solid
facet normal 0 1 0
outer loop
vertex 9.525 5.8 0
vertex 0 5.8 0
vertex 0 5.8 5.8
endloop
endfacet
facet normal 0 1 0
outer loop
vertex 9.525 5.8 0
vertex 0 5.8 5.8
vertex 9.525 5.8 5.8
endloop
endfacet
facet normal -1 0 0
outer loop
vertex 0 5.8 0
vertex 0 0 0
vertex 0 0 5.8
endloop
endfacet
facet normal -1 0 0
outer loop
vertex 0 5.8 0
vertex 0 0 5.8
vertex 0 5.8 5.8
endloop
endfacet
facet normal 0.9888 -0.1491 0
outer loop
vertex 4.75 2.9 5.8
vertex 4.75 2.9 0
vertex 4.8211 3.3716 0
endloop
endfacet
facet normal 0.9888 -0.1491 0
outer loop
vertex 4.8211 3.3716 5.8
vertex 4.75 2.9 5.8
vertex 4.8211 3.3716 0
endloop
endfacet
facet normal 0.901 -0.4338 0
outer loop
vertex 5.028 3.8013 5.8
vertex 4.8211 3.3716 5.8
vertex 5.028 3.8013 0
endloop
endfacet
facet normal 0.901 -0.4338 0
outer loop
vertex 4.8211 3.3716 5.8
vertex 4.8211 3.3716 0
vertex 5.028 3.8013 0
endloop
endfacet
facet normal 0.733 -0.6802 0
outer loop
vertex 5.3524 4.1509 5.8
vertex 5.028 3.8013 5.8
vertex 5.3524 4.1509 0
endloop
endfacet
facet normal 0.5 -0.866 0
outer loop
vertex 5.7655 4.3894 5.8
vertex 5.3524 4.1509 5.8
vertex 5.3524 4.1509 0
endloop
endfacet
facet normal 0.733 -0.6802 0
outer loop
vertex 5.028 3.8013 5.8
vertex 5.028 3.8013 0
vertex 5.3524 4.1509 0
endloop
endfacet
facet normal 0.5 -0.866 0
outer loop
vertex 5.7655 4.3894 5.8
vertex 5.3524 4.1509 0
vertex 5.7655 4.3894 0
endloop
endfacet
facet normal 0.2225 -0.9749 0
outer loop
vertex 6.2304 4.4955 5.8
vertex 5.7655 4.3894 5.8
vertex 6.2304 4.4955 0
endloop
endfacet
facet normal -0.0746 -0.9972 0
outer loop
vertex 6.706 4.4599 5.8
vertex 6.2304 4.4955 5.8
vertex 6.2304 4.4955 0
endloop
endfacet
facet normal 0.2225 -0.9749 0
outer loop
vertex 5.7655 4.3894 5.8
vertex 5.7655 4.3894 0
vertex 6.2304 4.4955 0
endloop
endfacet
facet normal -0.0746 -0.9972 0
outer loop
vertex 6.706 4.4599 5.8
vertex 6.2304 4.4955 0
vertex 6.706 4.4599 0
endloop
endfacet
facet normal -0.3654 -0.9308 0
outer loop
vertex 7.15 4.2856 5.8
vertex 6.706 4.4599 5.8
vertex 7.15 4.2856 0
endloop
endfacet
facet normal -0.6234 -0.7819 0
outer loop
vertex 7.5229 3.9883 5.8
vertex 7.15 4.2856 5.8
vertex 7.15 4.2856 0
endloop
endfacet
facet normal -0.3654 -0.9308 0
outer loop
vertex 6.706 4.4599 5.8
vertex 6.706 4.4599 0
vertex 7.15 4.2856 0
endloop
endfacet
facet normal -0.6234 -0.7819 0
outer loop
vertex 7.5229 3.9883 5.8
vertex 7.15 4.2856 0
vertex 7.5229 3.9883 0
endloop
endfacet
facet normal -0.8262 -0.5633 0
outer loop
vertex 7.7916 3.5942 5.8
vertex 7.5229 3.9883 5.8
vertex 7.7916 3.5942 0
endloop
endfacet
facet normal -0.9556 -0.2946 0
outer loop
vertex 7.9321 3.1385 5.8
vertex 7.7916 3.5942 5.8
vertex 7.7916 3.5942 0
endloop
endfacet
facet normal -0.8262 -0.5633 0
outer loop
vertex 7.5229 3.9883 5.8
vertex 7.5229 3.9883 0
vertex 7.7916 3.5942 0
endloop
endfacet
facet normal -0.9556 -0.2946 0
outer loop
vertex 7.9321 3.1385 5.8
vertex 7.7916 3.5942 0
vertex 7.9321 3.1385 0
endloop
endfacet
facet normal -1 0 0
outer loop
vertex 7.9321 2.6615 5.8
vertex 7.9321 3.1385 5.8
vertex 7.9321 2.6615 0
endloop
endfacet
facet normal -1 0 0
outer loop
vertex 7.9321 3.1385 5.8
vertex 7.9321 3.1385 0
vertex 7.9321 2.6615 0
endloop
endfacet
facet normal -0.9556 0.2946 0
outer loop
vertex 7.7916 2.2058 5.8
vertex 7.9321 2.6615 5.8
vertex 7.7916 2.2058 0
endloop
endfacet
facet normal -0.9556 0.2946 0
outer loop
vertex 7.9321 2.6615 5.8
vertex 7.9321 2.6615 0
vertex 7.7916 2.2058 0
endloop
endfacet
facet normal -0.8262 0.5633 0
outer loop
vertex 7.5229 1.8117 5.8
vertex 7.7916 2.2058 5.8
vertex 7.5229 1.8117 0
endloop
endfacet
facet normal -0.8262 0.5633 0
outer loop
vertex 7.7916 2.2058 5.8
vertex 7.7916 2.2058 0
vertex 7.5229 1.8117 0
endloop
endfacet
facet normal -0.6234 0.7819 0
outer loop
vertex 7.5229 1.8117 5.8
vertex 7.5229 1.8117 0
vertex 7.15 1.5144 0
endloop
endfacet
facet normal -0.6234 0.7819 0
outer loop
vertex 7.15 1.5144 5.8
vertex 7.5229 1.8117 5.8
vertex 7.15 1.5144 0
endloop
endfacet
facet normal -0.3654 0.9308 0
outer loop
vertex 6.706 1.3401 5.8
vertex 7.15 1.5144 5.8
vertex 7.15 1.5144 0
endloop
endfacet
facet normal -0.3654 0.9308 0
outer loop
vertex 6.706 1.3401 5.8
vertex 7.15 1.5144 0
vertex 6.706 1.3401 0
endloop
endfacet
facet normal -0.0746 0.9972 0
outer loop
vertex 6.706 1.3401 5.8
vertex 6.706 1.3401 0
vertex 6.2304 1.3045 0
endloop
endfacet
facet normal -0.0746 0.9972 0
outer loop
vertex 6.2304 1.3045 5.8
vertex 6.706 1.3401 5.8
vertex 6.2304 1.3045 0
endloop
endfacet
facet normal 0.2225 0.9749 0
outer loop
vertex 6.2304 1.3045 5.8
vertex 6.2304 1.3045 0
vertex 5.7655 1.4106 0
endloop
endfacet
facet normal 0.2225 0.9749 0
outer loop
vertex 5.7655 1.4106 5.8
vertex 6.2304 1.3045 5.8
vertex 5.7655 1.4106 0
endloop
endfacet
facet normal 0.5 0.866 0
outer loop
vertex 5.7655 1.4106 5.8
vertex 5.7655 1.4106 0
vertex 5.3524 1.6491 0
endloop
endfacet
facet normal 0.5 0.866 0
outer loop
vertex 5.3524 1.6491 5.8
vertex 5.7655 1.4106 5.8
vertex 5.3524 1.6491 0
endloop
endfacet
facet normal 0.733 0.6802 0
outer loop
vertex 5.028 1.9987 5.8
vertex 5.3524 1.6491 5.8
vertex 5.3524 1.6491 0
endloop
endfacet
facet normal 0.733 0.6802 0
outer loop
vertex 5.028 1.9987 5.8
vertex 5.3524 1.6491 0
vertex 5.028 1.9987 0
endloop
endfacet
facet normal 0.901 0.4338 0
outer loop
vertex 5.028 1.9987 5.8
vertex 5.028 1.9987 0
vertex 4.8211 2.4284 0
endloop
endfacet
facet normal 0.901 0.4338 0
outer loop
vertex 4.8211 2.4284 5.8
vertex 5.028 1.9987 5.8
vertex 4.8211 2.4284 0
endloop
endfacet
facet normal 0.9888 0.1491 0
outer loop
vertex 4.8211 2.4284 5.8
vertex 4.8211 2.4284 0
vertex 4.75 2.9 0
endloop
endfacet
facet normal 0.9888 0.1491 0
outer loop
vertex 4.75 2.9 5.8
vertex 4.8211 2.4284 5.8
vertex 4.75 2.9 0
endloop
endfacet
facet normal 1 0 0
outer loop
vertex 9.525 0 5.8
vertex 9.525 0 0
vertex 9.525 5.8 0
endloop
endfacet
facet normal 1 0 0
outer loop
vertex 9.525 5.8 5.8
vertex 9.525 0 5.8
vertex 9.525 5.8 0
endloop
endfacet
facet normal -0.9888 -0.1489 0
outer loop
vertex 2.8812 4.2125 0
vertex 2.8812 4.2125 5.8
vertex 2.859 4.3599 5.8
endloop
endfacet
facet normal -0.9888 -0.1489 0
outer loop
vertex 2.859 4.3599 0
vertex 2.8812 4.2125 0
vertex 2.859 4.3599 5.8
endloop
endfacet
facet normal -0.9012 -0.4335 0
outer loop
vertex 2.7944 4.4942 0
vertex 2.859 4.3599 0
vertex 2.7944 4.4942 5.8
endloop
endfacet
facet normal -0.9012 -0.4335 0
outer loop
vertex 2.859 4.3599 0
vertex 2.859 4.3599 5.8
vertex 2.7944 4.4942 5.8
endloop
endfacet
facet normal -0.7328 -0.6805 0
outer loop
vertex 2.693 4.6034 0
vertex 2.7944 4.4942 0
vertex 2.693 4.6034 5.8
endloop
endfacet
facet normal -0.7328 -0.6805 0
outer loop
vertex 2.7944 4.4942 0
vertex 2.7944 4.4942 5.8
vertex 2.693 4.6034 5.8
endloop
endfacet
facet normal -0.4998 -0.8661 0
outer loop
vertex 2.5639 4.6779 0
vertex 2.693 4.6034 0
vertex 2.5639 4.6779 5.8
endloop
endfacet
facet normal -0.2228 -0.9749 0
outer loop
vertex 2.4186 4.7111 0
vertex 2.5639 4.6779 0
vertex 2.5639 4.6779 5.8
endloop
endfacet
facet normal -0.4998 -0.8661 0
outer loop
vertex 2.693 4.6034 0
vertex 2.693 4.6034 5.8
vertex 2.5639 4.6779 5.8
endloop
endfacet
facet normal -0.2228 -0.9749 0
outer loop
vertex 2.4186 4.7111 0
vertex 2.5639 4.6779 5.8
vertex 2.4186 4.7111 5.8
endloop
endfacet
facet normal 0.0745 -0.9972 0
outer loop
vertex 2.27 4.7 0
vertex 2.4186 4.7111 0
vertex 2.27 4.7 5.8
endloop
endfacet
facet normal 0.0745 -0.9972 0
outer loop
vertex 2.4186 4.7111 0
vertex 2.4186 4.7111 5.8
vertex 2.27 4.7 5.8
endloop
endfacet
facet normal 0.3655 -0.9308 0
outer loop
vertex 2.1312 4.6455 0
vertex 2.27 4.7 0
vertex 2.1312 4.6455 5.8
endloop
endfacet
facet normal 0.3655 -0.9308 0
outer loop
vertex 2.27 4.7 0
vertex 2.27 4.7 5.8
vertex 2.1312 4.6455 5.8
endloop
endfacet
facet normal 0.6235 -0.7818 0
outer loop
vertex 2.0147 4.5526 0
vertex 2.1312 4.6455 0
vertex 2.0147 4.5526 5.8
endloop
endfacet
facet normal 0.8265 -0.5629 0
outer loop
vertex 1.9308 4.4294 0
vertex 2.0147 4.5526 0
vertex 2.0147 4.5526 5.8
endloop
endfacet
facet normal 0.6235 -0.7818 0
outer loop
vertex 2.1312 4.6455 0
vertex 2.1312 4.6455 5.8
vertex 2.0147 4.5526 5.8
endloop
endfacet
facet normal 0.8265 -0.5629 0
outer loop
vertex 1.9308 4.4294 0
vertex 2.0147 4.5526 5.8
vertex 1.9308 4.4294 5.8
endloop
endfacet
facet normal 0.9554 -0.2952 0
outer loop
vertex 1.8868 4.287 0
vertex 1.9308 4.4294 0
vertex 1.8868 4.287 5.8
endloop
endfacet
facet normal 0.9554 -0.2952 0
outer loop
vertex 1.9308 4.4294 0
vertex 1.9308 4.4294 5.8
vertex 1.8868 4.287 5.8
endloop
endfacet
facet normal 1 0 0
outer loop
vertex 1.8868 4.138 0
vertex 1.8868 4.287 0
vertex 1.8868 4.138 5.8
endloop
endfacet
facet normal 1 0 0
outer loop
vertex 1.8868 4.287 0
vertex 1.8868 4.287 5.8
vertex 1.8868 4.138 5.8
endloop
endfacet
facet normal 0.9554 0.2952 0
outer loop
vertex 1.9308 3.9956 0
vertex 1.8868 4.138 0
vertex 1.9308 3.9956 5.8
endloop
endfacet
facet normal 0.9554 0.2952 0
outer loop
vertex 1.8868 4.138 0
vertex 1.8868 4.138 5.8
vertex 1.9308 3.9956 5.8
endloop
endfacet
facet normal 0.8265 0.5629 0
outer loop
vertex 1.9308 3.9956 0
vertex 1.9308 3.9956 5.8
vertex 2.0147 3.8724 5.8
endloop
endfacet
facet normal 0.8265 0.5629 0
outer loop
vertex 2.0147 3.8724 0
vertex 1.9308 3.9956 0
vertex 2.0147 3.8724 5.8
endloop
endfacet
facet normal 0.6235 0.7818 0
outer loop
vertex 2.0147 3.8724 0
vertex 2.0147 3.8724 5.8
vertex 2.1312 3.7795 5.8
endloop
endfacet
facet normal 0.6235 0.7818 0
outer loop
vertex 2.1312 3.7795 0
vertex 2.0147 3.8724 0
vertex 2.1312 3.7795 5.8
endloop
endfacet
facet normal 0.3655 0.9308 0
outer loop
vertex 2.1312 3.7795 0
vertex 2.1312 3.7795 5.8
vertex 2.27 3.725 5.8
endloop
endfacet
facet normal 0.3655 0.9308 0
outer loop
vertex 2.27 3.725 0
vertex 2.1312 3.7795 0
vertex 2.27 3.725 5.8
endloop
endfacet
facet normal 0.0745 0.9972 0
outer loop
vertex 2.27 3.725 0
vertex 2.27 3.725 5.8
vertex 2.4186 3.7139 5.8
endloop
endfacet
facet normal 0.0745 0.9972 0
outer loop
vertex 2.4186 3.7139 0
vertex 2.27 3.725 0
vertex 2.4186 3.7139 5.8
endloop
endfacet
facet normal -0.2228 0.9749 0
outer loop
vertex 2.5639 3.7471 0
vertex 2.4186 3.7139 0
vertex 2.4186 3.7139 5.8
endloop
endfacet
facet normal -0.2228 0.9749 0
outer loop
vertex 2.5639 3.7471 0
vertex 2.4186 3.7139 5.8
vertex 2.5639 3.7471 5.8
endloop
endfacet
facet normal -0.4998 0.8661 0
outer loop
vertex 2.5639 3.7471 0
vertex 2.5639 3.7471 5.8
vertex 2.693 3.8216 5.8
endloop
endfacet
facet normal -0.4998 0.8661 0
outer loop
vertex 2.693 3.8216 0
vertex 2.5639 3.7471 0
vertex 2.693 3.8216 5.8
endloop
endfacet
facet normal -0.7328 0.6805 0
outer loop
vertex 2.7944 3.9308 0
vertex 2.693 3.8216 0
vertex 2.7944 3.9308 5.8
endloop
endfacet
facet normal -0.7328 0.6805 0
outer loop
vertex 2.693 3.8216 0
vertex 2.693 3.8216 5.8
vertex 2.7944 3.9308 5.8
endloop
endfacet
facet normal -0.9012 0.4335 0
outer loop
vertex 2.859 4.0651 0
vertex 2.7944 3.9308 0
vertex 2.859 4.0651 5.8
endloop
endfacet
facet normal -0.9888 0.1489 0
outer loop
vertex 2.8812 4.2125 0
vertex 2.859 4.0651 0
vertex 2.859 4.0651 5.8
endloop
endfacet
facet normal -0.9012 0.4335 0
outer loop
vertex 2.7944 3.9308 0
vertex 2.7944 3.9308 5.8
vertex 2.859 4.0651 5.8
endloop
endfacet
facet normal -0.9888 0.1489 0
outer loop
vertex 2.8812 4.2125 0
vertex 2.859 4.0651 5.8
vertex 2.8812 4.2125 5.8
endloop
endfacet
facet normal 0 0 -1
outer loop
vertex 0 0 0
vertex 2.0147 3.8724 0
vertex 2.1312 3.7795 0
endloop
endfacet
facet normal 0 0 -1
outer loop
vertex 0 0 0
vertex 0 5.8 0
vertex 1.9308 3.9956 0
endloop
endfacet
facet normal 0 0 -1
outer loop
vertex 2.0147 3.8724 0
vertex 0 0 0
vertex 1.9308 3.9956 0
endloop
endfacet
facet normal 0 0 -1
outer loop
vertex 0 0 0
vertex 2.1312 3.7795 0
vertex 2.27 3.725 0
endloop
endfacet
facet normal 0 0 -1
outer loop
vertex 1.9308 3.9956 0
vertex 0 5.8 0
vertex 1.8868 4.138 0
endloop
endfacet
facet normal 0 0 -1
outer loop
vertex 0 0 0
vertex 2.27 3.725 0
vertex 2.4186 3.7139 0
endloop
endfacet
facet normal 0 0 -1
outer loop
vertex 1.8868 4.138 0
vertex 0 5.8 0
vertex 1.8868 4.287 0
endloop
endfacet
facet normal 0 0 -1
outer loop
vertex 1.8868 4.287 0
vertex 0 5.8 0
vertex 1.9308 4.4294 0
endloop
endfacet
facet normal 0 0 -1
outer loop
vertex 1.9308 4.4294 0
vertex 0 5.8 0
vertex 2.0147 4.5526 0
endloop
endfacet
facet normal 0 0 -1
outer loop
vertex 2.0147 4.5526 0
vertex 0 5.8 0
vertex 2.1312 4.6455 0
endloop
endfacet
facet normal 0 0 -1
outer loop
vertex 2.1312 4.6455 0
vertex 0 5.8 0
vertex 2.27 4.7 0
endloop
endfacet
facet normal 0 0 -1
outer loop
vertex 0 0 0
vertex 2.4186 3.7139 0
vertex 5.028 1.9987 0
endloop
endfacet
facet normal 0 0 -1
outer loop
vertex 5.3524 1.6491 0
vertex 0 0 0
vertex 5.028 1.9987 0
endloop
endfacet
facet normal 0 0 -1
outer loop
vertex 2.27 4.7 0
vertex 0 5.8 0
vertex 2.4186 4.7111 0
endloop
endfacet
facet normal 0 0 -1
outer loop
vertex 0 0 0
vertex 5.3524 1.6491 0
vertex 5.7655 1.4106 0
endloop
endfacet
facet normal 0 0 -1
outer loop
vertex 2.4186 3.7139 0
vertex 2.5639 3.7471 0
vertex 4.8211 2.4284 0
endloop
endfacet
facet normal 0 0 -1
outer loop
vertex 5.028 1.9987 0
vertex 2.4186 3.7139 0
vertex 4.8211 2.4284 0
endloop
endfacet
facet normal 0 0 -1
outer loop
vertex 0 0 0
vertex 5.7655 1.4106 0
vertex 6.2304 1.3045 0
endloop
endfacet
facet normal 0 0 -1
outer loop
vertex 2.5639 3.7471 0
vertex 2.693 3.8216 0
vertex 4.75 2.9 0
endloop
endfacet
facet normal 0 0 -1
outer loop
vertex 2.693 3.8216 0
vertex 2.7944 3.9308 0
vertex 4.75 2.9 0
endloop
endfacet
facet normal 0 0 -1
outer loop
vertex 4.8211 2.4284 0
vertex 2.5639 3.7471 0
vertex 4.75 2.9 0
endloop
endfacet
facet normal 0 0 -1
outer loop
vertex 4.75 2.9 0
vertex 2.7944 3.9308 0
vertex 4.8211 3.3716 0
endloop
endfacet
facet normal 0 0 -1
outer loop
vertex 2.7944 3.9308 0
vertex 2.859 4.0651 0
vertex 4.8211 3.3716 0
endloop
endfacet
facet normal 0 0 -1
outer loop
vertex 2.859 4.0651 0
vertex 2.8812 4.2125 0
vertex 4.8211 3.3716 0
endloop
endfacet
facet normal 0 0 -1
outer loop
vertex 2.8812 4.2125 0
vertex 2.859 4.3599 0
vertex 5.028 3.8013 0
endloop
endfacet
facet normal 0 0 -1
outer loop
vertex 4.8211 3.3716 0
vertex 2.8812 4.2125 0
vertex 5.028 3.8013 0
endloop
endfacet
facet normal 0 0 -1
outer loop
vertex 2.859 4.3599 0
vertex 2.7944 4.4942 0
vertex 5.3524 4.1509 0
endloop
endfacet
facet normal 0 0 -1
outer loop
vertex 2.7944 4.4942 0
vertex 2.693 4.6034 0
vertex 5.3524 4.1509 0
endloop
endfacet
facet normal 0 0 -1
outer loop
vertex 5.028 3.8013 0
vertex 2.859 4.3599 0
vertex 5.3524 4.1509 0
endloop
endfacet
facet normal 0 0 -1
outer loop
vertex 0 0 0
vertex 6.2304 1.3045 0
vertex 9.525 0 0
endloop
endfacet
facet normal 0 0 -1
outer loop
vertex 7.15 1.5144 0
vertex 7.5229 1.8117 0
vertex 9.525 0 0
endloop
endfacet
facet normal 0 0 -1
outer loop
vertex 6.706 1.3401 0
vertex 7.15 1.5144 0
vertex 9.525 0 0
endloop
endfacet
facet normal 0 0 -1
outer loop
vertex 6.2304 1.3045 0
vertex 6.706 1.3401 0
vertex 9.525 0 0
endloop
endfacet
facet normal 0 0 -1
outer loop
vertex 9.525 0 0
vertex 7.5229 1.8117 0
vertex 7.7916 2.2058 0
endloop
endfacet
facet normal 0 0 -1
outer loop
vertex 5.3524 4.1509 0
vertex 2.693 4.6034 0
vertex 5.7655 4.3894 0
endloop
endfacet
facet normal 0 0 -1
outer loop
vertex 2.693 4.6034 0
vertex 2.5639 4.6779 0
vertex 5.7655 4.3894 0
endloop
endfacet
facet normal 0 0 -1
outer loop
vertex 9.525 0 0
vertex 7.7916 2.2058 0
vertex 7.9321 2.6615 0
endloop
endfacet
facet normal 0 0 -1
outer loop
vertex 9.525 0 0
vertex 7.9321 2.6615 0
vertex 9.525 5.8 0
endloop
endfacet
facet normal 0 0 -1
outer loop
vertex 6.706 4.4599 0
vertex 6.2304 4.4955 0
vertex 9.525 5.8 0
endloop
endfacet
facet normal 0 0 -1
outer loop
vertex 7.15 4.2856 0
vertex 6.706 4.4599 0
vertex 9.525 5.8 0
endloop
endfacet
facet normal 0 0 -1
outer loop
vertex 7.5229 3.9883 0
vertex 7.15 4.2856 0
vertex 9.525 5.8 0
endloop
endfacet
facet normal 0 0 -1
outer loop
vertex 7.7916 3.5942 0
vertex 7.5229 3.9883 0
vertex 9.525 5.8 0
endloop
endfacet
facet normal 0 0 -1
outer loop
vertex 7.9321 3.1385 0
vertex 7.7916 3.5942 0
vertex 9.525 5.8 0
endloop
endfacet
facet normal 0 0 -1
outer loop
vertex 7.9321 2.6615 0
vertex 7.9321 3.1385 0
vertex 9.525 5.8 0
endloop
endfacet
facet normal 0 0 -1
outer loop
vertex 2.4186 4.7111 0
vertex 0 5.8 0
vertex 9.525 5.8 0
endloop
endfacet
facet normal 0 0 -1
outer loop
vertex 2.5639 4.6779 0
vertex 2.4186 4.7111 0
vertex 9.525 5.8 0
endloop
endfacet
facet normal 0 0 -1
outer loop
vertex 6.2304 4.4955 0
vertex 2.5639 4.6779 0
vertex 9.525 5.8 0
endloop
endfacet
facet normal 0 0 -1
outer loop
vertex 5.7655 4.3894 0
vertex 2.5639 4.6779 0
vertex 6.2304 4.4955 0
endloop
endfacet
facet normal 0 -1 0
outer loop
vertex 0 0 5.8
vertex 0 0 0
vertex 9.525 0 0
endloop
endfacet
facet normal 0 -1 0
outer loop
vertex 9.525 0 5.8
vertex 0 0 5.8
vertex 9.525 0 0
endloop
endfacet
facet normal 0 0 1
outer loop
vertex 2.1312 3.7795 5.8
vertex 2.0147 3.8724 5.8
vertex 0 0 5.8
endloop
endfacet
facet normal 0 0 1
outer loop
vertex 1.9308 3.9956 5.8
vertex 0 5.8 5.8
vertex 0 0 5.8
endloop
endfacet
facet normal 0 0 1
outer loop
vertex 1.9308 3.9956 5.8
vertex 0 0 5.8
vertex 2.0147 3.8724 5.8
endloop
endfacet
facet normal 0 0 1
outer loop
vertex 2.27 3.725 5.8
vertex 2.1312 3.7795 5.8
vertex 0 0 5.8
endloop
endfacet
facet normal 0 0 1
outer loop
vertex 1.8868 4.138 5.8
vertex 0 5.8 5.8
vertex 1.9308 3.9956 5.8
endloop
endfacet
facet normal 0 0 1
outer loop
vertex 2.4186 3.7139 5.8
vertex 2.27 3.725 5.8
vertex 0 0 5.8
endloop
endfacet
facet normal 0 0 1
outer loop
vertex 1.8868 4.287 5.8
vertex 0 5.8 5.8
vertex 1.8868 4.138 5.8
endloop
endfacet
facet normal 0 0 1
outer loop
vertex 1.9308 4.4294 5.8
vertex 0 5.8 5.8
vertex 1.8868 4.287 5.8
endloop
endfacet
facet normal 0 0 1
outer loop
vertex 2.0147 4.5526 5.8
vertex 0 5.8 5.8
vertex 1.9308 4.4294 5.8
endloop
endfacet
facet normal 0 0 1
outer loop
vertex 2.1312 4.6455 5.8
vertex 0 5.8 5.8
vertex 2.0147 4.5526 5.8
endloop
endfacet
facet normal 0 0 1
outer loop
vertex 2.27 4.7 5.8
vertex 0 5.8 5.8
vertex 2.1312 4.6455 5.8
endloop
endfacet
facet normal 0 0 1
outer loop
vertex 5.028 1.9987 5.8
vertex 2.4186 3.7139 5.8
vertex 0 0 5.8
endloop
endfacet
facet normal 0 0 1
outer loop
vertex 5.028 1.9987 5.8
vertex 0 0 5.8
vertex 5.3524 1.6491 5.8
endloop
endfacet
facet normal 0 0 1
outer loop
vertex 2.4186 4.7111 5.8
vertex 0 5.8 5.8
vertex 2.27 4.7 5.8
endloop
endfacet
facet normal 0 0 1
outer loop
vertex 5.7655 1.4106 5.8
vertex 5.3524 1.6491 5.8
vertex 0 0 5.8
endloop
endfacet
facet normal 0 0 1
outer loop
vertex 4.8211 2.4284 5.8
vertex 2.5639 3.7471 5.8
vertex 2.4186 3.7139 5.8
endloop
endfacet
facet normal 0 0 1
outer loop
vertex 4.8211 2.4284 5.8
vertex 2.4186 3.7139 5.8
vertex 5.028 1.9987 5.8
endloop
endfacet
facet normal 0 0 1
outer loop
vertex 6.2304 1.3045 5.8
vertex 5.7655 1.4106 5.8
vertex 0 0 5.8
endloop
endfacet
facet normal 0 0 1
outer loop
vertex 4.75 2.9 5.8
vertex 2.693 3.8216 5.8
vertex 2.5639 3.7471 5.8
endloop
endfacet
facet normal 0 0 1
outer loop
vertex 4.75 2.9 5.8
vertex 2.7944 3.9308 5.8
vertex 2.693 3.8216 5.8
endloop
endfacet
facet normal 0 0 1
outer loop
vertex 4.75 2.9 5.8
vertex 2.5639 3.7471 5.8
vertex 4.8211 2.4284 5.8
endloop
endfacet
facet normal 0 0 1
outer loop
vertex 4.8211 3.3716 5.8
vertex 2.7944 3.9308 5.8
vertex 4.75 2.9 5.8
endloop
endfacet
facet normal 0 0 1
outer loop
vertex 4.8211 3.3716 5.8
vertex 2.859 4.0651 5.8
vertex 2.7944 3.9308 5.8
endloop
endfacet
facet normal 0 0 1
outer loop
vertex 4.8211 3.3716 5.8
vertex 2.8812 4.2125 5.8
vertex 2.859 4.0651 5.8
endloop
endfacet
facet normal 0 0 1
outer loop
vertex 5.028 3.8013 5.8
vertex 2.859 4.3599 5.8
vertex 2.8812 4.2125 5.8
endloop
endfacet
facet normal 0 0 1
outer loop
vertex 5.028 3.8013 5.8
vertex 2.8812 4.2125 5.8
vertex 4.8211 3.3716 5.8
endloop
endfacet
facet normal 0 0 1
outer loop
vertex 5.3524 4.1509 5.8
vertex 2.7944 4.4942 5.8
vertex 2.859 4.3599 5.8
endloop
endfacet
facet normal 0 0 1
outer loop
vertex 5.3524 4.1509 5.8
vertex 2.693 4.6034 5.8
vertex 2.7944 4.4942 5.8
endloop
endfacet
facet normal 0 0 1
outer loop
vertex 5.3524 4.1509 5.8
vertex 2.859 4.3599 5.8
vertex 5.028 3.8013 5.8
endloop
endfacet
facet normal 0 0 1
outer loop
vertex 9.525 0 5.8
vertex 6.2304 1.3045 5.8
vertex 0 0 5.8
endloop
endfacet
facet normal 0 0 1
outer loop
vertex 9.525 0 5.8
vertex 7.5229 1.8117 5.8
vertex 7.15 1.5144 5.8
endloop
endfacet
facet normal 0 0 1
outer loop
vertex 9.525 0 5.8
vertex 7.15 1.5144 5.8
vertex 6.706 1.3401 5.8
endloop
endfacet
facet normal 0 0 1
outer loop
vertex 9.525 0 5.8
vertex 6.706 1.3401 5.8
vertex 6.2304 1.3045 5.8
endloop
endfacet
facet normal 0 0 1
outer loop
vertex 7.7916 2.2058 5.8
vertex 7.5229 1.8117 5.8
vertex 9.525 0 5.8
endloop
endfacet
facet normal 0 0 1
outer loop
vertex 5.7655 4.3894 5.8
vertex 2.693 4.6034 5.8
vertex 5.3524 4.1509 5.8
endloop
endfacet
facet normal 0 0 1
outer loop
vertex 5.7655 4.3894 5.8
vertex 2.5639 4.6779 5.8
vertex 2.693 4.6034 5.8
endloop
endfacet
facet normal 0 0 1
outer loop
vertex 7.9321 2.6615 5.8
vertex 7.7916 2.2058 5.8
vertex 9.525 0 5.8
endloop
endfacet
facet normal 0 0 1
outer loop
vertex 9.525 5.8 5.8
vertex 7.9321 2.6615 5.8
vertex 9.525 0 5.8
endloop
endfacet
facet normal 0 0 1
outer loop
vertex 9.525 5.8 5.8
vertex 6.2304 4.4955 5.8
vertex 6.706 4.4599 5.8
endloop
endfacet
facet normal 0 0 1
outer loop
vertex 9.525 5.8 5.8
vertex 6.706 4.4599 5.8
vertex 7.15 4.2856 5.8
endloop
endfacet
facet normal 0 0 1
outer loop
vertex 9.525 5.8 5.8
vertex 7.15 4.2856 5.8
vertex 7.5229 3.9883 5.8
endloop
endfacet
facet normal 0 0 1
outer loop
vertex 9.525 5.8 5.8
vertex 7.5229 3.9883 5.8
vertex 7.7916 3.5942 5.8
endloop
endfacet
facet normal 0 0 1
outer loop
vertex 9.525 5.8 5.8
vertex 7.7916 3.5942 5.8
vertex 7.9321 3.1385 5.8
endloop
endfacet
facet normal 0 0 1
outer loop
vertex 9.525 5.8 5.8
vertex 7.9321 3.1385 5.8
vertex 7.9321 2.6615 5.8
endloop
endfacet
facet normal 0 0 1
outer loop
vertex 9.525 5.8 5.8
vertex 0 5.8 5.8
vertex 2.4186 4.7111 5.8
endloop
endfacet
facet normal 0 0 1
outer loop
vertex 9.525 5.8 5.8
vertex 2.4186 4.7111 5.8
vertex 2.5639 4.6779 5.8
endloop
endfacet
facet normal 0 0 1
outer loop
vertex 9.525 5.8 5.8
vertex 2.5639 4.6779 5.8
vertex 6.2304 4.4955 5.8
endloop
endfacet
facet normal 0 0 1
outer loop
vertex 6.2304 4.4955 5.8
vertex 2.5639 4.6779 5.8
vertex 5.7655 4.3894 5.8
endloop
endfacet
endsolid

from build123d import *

# Parameters (mm, degrees)
SKETCH1_W                = 9.525
SKETCH1_H                = 5.8
BOSS_EXTRUDE1_DEPTH      = 5.8
M3_CLEARANCE_HOLE1_D     = 3.2
M3_CLEARANCE_HOLE1_DEPTH = 12.7
M3_CLEARANCE_HOLE1_TIP   = 0.96137699
SKETCH5_R                = 0.5
CUT_EXTRUDE1_DEPTH       = 5.8


with BuildPart() as part:
    # Sketch1 → Boss-Extrude1 (new body)
    with BuildSketch(Plane.XY):
        with Locations((4.7625, 2.9)):
            Rectangle(SKETCH1_W, SKETCH1_H)
    extrude(amount=BOSS_EXTRUDE1_DEPTH)

    # M3 Clearance Hole1
    with Locations(Plane.XY.offset(5.8)):
        with Locations((6.35, 2.9)):
            Hole(M3_CLEARANCE_HOLE1_D / 2, depth=M3_CLEARANCE_HOLE1_DEPTH)
            with Locations((0, 0, -(M3_CLEARANCE_HOLE1_DEPTH + M3_CLEARANCE_HOLE1_TIP / 2))):  # 118° drill point
                Cone(0, M3_CLEARANCE_HOLE1_D / 2, M3_CLEARANCE_HOLE1_TIP, mode=Mode.SUBTRACT)

    # Sketch5 → Cut-Extrude1 (cut)
    with BuildSketch(Plane.XY.offset(5.8)):
        with Locations((2.38125, 4.2125)):
            Circle(SKETCH5_R)
    extrude(amount=-CUT_EXTRUDE1_DEPTH, mode=Mode.SUBTRACT)


solid = part.part
